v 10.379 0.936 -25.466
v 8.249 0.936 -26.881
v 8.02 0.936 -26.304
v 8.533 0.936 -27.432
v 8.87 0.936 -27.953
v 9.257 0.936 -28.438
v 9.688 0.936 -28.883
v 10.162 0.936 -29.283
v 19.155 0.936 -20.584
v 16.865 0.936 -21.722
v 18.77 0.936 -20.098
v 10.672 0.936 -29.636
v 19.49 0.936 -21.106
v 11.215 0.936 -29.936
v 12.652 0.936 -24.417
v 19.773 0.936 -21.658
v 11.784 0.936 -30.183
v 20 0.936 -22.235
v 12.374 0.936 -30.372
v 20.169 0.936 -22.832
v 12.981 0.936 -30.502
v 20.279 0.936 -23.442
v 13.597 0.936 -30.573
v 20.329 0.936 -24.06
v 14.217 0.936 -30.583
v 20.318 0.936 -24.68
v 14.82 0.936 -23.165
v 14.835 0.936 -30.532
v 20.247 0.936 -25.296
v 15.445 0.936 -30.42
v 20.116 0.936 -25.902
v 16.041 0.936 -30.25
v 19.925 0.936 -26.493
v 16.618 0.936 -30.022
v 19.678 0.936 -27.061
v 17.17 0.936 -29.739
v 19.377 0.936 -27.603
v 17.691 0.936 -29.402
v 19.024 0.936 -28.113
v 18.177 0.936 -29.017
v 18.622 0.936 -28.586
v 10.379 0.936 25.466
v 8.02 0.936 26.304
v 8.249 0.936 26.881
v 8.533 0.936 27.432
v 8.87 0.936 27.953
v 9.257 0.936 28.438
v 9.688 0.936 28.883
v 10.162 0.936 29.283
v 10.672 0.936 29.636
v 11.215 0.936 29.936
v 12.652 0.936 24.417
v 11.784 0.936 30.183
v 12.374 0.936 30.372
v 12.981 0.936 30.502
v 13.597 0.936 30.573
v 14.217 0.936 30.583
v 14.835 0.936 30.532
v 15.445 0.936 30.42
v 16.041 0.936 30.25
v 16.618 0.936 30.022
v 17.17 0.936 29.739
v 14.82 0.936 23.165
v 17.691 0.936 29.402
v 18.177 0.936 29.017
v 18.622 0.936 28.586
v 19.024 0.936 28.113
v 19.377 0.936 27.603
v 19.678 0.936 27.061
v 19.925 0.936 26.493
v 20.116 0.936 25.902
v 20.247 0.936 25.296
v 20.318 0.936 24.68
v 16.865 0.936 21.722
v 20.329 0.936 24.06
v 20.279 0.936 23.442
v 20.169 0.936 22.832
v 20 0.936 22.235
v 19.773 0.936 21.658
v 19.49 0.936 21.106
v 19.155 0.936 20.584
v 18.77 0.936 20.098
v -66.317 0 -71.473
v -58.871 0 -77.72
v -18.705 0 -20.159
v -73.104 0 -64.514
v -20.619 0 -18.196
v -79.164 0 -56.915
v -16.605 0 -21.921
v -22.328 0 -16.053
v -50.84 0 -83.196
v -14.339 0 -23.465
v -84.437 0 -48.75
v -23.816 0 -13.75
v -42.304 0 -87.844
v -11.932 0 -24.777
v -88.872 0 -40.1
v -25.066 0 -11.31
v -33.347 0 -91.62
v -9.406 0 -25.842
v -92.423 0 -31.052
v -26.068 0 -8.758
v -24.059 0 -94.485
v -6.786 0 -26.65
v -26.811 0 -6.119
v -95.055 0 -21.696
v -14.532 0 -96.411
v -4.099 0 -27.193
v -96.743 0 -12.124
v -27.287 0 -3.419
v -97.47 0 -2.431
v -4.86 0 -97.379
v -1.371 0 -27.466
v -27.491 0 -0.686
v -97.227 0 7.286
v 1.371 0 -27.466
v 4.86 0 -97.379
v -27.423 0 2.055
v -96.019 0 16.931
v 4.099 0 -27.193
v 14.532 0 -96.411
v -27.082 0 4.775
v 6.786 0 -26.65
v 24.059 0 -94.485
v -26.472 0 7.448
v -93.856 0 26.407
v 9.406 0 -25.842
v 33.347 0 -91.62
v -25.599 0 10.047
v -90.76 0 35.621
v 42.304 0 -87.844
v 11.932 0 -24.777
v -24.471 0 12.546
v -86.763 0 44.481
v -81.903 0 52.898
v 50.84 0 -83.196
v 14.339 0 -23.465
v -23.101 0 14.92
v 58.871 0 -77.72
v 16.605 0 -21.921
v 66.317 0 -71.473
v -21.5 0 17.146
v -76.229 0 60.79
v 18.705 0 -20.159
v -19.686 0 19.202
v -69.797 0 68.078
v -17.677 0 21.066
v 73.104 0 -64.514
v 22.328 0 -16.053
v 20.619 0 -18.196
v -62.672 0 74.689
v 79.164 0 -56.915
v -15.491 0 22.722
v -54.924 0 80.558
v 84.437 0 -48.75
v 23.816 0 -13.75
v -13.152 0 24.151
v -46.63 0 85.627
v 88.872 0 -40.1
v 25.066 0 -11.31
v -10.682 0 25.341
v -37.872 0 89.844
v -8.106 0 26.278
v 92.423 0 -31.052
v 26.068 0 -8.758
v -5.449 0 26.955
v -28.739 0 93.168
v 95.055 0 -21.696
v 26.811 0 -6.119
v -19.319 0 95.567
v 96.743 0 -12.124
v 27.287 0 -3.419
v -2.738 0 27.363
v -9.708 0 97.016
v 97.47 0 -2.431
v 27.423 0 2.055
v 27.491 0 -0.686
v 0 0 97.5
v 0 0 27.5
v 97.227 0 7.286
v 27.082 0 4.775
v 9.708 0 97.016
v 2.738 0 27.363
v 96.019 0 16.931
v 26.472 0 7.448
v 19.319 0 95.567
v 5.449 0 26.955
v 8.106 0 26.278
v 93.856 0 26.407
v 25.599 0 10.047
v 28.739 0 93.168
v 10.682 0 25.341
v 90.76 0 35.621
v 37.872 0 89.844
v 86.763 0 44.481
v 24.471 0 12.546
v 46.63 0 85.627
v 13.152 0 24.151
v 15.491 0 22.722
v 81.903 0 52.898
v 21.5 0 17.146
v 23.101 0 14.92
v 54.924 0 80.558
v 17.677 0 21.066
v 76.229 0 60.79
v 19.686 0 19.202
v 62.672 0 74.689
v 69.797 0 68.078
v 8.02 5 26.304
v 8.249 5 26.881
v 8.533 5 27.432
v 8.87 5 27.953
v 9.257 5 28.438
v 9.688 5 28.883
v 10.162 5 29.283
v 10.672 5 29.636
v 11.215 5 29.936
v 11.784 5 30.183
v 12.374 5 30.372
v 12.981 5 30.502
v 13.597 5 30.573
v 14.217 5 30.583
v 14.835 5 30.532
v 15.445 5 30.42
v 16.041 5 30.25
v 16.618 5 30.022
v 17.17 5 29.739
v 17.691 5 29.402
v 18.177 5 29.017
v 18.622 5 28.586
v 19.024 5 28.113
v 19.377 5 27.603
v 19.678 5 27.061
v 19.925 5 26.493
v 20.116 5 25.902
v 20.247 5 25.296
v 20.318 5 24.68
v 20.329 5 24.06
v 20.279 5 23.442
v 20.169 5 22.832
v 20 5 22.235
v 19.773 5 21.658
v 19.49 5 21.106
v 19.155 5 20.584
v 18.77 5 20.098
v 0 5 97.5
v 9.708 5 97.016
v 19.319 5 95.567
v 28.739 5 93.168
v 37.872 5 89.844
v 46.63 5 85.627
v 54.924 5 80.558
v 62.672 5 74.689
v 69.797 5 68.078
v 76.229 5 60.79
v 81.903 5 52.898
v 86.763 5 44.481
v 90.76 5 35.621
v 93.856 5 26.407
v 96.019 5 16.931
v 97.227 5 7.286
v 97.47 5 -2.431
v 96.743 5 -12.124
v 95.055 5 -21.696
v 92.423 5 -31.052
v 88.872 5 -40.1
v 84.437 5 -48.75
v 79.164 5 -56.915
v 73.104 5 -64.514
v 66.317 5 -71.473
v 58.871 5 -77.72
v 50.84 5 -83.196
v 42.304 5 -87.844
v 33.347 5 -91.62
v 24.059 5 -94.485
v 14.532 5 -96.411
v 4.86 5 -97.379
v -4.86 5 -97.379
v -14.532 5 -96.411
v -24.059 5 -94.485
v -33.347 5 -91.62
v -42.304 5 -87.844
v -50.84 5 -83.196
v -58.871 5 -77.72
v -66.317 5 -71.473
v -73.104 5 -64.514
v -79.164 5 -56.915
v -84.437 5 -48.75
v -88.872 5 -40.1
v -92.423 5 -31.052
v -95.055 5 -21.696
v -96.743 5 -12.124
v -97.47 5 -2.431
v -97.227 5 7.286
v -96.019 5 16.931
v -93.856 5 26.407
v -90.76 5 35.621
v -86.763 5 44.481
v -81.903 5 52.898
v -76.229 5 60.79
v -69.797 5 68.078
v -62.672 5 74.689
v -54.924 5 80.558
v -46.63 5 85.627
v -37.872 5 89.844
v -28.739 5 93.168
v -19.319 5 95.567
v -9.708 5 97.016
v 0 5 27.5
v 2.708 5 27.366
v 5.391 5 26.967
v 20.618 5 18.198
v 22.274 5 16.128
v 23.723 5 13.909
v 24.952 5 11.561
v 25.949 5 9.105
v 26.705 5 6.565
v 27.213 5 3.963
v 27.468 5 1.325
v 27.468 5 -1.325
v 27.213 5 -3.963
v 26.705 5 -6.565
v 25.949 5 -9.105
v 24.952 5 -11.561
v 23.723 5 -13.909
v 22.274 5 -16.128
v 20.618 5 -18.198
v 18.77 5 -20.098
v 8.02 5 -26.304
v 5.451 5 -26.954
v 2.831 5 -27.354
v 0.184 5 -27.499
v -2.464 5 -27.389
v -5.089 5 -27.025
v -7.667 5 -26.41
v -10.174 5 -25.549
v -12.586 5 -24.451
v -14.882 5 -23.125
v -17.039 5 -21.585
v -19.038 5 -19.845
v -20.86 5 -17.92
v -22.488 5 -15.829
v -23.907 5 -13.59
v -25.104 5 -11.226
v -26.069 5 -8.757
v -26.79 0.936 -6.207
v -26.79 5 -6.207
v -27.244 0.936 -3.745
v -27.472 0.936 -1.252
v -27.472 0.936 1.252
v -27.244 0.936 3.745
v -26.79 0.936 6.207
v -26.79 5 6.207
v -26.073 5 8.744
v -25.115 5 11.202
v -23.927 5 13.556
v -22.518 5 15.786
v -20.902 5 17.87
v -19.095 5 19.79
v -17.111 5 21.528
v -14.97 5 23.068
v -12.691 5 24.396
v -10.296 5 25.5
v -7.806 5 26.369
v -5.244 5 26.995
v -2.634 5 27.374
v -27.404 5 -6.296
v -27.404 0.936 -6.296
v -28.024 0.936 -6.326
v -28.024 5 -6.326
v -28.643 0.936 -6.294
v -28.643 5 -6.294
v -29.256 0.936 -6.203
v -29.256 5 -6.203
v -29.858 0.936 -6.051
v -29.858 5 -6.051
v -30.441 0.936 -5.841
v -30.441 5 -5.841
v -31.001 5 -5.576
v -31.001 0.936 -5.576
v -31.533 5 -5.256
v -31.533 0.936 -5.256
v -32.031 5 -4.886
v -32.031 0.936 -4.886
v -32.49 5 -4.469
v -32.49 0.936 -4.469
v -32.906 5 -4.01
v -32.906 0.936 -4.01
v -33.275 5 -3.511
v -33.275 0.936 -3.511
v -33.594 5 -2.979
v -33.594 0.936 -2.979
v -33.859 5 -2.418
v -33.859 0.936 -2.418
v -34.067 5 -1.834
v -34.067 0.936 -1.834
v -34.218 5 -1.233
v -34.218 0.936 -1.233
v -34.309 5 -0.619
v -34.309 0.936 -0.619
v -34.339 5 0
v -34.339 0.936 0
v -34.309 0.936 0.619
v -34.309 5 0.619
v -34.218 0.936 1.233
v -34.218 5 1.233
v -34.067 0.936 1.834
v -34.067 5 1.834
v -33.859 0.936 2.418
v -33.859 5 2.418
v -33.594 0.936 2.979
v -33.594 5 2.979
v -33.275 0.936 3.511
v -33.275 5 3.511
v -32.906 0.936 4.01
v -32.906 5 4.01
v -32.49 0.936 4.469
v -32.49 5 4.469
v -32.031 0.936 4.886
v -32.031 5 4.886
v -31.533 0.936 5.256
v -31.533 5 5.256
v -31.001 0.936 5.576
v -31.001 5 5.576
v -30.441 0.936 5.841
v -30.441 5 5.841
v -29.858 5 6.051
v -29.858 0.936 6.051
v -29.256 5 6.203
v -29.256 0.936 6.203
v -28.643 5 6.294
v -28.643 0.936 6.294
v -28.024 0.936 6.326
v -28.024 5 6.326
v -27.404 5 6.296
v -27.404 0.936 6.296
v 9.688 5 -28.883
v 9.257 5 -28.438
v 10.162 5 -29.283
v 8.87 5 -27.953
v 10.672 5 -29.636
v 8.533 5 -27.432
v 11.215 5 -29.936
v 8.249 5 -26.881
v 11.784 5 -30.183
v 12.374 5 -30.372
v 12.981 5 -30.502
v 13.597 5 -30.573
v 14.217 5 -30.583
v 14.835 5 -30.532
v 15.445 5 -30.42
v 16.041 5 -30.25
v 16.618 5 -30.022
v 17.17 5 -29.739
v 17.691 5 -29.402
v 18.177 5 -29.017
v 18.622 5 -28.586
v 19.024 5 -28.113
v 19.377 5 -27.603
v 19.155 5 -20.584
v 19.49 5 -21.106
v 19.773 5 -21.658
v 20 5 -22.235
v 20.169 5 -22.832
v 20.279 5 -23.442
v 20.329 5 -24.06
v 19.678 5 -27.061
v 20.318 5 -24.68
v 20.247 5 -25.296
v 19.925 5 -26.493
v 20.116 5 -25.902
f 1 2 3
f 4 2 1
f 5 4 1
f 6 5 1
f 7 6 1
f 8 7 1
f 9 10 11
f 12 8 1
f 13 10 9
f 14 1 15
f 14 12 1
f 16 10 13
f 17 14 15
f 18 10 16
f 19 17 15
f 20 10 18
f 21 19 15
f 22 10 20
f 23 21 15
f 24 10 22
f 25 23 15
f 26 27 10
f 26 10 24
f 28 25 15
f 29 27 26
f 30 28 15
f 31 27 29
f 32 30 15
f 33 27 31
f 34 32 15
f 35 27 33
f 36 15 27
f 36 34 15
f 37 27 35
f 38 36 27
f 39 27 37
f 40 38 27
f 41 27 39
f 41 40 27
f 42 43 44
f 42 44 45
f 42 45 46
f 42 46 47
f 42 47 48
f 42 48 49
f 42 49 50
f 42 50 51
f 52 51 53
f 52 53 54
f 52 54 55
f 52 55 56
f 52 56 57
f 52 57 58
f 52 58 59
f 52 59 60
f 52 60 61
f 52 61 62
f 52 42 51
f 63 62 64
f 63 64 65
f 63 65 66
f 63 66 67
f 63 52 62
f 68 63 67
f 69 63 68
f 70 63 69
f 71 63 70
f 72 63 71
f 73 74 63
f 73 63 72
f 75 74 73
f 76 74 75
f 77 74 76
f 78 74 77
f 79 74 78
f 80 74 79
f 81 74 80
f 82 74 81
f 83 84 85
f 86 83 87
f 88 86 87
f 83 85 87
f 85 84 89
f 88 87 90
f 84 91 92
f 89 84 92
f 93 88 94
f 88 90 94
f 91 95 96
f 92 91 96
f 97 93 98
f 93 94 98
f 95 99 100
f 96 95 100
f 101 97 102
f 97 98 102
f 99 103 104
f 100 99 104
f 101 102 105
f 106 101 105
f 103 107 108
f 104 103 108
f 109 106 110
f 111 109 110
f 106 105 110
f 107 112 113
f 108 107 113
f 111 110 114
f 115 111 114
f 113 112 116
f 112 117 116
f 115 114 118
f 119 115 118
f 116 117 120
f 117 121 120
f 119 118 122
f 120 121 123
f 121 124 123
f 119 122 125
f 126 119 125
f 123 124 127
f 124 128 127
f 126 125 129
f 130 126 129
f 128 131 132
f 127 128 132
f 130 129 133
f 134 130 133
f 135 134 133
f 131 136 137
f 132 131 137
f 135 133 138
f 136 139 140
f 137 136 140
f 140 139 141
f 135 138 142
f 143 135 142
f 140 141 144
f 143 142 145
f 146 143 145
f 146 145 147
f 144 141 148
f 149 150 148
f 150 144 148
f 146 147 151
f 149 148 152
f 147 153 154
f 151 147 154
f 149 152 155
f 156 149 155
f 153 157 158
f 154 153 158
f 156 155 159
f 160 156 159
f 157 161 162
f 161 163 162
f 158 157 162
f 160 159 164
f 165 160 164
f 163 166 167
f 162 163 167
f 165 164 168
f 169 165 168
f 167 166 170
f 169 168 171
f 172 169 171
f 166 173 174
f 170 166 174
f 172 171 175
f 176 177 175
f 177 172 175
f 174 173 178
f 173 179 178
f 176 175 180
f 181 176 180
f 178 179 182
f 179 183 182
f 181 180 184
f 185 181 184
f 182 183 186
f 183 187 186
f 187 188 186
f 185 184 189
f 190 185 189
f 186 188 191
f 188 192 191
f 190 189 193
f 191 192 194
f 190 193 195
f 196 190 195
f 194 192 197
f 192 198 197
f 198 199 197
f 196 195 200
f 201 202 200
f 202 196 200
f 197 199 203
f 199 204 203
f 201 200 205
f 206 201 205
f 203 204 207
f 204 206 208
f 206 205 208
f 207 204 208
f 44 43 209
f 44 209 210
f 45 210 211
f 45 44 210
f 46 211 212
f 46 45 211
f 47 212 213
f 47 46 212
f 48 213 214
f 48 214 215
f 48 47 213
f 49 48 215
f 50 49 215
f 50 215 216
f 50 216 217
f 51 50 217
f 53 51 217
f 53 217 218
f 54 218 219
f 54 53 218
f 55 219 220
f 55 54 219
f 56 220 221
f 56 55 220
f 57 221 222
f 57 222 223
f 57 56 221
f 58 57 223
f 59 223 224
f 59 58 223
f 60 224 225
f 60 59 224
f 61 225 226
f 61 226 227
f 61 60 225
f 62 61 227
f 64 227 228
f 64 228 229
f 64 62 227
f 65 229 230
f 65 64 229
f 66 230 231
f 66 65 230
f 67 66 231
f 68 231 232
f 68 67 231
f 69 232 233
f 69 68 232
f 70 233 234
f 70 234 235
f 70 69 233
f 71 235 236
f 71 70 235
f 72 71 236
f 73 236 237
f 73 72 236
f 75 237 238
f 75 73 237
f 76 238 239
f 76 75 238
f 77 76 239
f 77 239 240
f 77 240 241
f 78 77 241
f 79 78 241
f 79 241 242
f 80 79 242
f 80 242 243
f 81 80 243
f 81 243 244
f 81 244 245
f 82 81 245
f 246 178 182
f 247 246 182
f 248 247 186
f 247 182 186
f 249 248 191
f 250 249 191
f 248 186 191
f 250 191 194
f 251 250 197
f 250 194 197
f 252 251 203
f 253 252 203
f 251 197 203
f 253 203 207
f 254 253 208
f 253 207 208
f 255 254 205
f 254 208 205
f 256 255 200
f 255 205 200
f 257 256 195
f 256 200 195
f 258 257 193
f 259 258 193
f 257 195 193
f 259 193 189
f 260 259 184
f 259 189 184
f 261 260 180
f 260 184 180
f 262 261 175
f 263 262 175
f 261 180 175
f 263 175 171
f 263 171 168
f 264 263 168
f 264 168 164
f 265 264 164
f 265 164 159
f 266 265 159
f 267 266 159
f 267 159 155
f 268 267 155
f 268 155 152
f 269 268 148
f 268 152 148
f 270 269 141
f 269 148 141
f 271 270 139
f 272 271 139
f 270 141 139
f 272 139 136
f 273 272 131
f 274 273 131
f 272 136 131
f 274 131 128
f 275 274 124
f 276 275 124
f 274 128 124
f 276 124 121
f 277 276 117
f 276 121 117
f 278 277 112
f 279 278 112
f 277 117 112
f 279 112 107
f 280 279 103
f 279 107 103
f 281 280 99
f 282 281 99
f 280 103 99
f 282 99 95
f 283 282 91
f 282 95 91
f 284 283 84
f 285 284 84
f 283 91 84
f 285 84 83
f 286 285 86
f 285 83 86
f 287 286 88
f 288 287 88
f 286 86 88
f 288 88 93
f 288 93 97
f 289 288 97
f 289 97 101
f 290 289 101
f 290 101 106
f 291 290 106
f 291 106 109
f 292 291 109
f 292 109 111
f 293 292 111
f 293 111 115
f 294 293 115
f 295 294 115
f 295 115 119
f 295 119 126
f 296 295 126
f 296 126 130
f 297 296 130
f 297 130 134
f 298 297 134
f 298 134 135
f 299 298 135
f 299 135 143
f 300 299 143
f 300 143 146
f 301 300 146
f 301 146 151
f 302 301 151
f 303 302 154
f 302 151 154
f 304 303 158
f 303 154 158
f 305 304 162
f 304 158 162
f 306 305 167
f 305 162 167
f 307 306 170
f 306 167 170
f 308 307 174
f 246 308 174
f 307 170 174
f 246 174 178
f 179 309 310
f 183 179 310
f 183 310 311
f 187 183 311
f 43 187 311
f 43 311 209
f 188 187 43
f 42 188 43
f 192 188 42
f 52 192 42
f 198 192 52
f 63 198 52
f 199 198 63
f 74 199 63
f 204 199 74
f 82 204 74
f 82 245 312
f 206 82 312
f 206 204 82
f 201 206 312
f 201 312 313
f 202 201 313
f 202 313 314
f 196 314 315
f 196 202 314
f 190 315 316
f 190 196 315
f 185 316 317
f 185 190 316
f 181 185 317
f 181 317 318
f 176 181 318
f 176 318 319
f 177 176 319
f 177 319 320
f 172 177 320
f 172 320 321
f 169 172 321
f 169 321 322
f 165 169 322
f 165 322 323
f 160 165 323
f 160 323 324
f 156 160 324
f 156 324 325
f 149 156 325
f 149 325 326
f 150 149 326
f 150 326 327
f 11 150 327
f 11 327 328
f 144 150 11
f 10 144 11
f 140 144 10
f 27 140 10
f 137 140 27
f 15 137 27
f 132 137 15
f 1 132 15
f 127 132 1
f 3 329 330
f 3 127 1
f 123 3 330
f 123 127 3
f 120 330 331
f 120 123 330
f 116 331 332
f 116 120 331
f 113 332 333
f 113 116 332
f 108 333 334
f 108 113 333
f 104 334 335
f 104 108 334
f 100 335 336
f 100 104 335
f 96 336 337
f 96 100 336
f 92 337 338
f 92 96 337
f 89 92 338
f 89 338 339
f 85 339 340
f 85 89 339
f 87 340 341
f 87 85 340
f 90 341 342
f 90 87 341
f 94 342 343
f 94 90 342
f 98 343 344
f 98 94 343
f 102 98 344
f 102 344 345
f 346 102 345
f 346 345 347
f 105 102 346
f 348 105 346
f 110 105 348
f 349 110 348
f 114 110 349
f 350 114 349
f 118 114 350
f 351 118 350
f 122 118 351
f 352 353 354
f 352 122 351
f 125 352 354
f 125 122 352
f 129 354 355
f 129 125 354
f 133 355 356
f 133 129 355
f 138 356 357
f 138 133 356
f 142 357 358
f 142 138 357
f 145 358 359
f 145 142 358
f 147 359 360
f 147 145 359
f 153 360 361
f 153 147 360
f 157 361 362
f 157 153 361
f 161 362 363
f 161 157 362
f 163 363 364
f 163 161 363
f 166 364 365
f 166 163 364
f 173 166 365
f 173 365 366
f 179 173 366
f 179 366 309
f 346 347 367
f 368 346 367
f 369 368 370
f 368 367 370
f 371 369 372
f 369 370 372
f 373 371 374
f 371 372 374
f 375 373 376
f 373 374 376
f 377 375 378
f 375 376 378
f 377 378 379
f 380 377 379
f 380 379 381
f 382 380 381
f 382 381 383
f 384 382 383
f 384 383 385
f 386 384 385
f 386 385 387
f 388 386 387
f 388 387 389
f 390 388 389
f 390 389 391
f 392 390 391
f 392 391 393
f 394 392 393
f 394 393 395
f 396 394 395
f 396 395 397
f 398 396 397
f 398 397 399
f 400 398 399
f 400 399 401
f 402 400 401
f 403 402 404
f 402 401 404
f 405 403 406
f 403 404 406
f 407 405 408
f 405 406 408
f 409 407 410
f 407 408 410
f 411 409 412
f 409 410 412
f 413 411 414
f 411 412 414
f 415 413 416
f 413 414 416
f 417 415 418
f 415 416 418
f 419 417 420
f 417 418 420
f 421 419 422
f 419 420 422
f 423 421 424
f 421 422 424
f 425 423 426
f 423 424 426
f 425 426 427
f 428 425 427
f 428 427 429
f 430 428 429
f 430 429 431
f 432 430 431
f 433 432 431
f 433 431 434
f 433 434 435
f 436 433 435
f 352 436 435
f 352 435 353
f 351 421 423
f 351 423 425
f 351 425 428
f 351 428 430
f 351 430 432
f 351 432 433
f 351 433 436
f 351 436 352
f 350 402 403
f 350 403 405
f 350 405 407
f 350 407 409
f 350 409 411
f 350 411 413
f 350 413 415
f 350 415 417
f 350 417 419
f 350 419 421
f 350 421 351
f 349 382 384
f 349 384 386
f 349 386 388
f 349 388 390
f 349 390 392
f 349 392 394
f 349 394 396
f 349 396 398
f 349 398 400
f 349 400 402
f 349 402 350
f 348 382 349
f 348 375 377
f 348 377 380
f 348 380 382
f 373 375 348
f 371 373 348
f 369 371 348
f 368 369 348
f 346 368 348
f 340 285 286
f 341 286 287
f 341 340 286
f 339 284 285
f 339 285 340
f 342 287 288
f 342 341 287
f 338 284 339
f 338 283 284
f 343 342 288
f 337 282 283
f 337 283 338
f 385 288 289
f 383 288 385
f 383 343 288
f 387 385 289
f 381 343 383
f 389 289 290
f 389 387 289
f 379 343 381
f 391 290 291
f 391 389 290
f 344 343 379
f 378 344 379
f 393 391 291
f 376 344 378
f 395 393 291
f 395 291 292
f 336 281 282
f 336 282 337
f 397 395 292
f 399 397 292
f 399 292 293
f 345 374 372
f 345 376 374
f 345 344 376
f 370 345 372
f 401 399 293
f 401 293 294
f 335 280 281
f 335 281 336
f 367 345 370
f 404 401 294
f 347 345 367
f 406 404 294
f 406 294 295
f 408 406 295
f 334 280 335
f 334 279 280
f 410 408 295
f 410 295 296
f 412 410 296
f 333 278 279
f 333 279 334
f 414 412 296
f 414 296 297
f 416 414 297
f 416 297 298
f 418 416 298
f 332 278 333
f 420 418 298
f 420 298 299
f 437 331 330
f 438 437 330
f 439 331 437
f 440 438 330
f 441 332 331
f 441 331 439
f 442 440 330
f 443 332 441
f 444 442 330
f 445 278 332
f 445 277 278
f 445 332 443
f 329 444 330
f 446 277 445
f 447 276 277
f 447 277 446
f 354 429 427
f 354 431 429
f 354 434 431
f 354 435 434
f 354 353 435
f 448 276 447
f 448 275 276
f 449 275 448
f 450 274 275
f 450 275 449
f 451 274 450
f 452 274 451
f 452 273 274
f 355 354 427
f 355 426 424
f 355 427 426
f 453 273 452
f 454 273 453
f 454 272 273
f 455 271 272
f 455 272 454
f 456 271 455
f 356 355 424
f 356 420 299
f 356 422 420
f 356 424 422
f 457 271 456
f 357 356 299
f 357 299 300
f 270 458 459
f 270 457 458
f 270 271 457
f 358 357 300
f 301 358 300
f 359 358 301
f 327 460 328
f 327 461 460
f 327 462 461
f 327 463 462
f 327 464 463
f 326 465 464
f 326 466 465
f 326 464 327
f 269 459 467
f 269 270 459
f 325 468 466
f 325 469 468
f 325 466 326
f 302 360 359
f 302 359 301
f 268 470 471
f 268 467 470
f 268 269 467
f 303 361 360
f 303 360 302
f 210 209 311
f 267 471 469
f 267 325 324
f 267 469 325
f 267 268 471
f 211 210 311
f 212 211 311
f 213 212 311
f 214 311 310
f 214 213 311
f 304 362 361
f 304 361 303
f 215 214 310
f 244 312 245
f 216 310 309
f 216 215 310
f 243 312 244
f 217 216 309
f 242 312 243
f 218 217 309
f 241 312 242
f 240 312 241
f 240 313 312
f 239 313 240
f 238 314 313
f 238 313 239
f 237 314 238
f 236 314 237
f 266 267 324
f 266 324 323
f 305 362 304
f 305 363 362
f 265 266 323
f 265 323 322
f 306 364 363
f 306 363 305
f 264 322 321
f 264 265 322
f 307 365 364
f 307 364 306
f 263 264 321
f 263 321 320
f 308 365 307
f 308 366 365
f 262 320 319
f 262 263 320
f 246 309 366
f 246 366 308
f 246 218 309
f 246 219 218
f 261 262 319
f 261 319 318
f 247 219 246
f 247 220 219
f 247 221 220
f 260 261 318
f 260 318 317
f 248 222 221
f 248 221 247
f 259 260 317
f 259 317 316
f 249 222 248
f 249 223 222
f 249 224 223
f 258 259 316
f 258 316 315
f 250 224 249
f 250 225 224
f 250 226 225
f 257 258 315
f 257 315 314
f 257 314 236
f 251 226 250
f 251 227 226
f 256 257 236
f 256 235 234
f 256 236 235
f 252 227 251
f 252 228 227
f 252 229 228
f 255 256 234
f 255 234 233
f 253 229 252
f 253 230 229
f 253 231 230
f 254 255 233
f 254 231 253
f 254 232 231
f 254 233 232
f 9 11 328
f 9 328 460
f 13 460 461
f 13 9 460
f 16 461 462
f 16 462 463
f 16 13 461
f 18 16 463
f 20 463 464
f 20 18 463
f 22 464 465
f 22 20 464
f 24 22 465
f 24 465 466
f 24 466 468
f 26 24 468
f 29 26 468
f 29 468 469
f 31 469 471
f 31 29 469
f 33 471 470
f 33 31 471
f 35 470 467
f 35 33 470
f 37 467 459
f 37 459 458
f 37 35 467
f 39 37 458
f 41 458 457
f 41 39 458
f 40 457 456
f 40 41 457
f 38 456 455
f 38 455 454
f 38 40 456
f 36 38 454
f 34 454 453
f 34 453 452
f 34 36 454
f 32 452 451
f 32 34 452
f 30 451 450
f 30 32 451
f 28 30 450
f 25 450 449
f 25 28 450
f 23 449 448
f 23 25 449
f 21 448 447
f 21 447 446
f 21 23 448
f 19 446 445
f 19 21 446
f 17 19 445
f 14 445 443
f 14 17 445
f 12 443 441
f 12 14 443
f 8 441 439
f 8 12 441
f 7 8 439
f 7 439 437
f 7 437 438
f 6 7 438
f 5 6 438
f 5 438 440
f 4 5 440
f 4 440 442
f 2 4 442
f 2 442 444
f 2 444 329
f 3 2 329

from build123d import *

# Parameters (mm, degrees)
SKETCH1_R           = 97.5
BOSS_EXTRUDE1_DEPTH = 5
SKETCH2_R           = 27.5
CUT_EXTRUDE1_DEPTH  = 138.976447265
SKETCH3_R           = 6.325847544
CUT_EXTRUDE2_DEPTH  = 4.064145518
CIRPATTERN1_COUNT   = 3


with BuildPart() as part:
    # Sketch1 → Boss-Extrude1 (new body)
    with BuildSketch(Plane(origin=(0, 0, 0), x_dir=(1, 0, 0), z_dir=(0, 1, 0))):
        Circle(SKETCH1_R)
    extrude(amount=BOSS_EXTRUDE1_DEPTH)

    # Sketch2 → Cut-Extrude1 (cut, through all)
    with BuildSketch(Plane(origin=(0, 0, 0), x_dir=(1, 0, 0), z_dir=(0, 1, 0))):
        Circle(SKETCH2_R)
    extrude(amount=CUT_EXTRUDE1_DEPTH, mode=Mode.SUBTRACT)

    # Sketch3 → Cut-Extrude2 (cut)
    with BuildSketch(Plane(origin=(0, 5, 0), x_dir=(1, 0, 0), z_dir=(0, 1, 0))):
        with Locations((-28.013239074, 0)):
            Circle(SKETCH3_R)
    cut_extrude2 = extrude(amount=-CUT_EXTRUDE2_DEPTH, mode=Mode.SUBTRACT)

    # CirPattern1: Cut-Extrude2 ×3 about axis
    cirpattern1_axis = Axis((0, 0, 0), (0, 1, 0))
    for i in range(1, CIRPATTERN1_COUNT):
        add(cut_extrude2.rotate(cirpattern1_axis, i * 360 / CIRPATTERN1_COUNT), mode=Mode.SUBTRACT)


solid = part.part
